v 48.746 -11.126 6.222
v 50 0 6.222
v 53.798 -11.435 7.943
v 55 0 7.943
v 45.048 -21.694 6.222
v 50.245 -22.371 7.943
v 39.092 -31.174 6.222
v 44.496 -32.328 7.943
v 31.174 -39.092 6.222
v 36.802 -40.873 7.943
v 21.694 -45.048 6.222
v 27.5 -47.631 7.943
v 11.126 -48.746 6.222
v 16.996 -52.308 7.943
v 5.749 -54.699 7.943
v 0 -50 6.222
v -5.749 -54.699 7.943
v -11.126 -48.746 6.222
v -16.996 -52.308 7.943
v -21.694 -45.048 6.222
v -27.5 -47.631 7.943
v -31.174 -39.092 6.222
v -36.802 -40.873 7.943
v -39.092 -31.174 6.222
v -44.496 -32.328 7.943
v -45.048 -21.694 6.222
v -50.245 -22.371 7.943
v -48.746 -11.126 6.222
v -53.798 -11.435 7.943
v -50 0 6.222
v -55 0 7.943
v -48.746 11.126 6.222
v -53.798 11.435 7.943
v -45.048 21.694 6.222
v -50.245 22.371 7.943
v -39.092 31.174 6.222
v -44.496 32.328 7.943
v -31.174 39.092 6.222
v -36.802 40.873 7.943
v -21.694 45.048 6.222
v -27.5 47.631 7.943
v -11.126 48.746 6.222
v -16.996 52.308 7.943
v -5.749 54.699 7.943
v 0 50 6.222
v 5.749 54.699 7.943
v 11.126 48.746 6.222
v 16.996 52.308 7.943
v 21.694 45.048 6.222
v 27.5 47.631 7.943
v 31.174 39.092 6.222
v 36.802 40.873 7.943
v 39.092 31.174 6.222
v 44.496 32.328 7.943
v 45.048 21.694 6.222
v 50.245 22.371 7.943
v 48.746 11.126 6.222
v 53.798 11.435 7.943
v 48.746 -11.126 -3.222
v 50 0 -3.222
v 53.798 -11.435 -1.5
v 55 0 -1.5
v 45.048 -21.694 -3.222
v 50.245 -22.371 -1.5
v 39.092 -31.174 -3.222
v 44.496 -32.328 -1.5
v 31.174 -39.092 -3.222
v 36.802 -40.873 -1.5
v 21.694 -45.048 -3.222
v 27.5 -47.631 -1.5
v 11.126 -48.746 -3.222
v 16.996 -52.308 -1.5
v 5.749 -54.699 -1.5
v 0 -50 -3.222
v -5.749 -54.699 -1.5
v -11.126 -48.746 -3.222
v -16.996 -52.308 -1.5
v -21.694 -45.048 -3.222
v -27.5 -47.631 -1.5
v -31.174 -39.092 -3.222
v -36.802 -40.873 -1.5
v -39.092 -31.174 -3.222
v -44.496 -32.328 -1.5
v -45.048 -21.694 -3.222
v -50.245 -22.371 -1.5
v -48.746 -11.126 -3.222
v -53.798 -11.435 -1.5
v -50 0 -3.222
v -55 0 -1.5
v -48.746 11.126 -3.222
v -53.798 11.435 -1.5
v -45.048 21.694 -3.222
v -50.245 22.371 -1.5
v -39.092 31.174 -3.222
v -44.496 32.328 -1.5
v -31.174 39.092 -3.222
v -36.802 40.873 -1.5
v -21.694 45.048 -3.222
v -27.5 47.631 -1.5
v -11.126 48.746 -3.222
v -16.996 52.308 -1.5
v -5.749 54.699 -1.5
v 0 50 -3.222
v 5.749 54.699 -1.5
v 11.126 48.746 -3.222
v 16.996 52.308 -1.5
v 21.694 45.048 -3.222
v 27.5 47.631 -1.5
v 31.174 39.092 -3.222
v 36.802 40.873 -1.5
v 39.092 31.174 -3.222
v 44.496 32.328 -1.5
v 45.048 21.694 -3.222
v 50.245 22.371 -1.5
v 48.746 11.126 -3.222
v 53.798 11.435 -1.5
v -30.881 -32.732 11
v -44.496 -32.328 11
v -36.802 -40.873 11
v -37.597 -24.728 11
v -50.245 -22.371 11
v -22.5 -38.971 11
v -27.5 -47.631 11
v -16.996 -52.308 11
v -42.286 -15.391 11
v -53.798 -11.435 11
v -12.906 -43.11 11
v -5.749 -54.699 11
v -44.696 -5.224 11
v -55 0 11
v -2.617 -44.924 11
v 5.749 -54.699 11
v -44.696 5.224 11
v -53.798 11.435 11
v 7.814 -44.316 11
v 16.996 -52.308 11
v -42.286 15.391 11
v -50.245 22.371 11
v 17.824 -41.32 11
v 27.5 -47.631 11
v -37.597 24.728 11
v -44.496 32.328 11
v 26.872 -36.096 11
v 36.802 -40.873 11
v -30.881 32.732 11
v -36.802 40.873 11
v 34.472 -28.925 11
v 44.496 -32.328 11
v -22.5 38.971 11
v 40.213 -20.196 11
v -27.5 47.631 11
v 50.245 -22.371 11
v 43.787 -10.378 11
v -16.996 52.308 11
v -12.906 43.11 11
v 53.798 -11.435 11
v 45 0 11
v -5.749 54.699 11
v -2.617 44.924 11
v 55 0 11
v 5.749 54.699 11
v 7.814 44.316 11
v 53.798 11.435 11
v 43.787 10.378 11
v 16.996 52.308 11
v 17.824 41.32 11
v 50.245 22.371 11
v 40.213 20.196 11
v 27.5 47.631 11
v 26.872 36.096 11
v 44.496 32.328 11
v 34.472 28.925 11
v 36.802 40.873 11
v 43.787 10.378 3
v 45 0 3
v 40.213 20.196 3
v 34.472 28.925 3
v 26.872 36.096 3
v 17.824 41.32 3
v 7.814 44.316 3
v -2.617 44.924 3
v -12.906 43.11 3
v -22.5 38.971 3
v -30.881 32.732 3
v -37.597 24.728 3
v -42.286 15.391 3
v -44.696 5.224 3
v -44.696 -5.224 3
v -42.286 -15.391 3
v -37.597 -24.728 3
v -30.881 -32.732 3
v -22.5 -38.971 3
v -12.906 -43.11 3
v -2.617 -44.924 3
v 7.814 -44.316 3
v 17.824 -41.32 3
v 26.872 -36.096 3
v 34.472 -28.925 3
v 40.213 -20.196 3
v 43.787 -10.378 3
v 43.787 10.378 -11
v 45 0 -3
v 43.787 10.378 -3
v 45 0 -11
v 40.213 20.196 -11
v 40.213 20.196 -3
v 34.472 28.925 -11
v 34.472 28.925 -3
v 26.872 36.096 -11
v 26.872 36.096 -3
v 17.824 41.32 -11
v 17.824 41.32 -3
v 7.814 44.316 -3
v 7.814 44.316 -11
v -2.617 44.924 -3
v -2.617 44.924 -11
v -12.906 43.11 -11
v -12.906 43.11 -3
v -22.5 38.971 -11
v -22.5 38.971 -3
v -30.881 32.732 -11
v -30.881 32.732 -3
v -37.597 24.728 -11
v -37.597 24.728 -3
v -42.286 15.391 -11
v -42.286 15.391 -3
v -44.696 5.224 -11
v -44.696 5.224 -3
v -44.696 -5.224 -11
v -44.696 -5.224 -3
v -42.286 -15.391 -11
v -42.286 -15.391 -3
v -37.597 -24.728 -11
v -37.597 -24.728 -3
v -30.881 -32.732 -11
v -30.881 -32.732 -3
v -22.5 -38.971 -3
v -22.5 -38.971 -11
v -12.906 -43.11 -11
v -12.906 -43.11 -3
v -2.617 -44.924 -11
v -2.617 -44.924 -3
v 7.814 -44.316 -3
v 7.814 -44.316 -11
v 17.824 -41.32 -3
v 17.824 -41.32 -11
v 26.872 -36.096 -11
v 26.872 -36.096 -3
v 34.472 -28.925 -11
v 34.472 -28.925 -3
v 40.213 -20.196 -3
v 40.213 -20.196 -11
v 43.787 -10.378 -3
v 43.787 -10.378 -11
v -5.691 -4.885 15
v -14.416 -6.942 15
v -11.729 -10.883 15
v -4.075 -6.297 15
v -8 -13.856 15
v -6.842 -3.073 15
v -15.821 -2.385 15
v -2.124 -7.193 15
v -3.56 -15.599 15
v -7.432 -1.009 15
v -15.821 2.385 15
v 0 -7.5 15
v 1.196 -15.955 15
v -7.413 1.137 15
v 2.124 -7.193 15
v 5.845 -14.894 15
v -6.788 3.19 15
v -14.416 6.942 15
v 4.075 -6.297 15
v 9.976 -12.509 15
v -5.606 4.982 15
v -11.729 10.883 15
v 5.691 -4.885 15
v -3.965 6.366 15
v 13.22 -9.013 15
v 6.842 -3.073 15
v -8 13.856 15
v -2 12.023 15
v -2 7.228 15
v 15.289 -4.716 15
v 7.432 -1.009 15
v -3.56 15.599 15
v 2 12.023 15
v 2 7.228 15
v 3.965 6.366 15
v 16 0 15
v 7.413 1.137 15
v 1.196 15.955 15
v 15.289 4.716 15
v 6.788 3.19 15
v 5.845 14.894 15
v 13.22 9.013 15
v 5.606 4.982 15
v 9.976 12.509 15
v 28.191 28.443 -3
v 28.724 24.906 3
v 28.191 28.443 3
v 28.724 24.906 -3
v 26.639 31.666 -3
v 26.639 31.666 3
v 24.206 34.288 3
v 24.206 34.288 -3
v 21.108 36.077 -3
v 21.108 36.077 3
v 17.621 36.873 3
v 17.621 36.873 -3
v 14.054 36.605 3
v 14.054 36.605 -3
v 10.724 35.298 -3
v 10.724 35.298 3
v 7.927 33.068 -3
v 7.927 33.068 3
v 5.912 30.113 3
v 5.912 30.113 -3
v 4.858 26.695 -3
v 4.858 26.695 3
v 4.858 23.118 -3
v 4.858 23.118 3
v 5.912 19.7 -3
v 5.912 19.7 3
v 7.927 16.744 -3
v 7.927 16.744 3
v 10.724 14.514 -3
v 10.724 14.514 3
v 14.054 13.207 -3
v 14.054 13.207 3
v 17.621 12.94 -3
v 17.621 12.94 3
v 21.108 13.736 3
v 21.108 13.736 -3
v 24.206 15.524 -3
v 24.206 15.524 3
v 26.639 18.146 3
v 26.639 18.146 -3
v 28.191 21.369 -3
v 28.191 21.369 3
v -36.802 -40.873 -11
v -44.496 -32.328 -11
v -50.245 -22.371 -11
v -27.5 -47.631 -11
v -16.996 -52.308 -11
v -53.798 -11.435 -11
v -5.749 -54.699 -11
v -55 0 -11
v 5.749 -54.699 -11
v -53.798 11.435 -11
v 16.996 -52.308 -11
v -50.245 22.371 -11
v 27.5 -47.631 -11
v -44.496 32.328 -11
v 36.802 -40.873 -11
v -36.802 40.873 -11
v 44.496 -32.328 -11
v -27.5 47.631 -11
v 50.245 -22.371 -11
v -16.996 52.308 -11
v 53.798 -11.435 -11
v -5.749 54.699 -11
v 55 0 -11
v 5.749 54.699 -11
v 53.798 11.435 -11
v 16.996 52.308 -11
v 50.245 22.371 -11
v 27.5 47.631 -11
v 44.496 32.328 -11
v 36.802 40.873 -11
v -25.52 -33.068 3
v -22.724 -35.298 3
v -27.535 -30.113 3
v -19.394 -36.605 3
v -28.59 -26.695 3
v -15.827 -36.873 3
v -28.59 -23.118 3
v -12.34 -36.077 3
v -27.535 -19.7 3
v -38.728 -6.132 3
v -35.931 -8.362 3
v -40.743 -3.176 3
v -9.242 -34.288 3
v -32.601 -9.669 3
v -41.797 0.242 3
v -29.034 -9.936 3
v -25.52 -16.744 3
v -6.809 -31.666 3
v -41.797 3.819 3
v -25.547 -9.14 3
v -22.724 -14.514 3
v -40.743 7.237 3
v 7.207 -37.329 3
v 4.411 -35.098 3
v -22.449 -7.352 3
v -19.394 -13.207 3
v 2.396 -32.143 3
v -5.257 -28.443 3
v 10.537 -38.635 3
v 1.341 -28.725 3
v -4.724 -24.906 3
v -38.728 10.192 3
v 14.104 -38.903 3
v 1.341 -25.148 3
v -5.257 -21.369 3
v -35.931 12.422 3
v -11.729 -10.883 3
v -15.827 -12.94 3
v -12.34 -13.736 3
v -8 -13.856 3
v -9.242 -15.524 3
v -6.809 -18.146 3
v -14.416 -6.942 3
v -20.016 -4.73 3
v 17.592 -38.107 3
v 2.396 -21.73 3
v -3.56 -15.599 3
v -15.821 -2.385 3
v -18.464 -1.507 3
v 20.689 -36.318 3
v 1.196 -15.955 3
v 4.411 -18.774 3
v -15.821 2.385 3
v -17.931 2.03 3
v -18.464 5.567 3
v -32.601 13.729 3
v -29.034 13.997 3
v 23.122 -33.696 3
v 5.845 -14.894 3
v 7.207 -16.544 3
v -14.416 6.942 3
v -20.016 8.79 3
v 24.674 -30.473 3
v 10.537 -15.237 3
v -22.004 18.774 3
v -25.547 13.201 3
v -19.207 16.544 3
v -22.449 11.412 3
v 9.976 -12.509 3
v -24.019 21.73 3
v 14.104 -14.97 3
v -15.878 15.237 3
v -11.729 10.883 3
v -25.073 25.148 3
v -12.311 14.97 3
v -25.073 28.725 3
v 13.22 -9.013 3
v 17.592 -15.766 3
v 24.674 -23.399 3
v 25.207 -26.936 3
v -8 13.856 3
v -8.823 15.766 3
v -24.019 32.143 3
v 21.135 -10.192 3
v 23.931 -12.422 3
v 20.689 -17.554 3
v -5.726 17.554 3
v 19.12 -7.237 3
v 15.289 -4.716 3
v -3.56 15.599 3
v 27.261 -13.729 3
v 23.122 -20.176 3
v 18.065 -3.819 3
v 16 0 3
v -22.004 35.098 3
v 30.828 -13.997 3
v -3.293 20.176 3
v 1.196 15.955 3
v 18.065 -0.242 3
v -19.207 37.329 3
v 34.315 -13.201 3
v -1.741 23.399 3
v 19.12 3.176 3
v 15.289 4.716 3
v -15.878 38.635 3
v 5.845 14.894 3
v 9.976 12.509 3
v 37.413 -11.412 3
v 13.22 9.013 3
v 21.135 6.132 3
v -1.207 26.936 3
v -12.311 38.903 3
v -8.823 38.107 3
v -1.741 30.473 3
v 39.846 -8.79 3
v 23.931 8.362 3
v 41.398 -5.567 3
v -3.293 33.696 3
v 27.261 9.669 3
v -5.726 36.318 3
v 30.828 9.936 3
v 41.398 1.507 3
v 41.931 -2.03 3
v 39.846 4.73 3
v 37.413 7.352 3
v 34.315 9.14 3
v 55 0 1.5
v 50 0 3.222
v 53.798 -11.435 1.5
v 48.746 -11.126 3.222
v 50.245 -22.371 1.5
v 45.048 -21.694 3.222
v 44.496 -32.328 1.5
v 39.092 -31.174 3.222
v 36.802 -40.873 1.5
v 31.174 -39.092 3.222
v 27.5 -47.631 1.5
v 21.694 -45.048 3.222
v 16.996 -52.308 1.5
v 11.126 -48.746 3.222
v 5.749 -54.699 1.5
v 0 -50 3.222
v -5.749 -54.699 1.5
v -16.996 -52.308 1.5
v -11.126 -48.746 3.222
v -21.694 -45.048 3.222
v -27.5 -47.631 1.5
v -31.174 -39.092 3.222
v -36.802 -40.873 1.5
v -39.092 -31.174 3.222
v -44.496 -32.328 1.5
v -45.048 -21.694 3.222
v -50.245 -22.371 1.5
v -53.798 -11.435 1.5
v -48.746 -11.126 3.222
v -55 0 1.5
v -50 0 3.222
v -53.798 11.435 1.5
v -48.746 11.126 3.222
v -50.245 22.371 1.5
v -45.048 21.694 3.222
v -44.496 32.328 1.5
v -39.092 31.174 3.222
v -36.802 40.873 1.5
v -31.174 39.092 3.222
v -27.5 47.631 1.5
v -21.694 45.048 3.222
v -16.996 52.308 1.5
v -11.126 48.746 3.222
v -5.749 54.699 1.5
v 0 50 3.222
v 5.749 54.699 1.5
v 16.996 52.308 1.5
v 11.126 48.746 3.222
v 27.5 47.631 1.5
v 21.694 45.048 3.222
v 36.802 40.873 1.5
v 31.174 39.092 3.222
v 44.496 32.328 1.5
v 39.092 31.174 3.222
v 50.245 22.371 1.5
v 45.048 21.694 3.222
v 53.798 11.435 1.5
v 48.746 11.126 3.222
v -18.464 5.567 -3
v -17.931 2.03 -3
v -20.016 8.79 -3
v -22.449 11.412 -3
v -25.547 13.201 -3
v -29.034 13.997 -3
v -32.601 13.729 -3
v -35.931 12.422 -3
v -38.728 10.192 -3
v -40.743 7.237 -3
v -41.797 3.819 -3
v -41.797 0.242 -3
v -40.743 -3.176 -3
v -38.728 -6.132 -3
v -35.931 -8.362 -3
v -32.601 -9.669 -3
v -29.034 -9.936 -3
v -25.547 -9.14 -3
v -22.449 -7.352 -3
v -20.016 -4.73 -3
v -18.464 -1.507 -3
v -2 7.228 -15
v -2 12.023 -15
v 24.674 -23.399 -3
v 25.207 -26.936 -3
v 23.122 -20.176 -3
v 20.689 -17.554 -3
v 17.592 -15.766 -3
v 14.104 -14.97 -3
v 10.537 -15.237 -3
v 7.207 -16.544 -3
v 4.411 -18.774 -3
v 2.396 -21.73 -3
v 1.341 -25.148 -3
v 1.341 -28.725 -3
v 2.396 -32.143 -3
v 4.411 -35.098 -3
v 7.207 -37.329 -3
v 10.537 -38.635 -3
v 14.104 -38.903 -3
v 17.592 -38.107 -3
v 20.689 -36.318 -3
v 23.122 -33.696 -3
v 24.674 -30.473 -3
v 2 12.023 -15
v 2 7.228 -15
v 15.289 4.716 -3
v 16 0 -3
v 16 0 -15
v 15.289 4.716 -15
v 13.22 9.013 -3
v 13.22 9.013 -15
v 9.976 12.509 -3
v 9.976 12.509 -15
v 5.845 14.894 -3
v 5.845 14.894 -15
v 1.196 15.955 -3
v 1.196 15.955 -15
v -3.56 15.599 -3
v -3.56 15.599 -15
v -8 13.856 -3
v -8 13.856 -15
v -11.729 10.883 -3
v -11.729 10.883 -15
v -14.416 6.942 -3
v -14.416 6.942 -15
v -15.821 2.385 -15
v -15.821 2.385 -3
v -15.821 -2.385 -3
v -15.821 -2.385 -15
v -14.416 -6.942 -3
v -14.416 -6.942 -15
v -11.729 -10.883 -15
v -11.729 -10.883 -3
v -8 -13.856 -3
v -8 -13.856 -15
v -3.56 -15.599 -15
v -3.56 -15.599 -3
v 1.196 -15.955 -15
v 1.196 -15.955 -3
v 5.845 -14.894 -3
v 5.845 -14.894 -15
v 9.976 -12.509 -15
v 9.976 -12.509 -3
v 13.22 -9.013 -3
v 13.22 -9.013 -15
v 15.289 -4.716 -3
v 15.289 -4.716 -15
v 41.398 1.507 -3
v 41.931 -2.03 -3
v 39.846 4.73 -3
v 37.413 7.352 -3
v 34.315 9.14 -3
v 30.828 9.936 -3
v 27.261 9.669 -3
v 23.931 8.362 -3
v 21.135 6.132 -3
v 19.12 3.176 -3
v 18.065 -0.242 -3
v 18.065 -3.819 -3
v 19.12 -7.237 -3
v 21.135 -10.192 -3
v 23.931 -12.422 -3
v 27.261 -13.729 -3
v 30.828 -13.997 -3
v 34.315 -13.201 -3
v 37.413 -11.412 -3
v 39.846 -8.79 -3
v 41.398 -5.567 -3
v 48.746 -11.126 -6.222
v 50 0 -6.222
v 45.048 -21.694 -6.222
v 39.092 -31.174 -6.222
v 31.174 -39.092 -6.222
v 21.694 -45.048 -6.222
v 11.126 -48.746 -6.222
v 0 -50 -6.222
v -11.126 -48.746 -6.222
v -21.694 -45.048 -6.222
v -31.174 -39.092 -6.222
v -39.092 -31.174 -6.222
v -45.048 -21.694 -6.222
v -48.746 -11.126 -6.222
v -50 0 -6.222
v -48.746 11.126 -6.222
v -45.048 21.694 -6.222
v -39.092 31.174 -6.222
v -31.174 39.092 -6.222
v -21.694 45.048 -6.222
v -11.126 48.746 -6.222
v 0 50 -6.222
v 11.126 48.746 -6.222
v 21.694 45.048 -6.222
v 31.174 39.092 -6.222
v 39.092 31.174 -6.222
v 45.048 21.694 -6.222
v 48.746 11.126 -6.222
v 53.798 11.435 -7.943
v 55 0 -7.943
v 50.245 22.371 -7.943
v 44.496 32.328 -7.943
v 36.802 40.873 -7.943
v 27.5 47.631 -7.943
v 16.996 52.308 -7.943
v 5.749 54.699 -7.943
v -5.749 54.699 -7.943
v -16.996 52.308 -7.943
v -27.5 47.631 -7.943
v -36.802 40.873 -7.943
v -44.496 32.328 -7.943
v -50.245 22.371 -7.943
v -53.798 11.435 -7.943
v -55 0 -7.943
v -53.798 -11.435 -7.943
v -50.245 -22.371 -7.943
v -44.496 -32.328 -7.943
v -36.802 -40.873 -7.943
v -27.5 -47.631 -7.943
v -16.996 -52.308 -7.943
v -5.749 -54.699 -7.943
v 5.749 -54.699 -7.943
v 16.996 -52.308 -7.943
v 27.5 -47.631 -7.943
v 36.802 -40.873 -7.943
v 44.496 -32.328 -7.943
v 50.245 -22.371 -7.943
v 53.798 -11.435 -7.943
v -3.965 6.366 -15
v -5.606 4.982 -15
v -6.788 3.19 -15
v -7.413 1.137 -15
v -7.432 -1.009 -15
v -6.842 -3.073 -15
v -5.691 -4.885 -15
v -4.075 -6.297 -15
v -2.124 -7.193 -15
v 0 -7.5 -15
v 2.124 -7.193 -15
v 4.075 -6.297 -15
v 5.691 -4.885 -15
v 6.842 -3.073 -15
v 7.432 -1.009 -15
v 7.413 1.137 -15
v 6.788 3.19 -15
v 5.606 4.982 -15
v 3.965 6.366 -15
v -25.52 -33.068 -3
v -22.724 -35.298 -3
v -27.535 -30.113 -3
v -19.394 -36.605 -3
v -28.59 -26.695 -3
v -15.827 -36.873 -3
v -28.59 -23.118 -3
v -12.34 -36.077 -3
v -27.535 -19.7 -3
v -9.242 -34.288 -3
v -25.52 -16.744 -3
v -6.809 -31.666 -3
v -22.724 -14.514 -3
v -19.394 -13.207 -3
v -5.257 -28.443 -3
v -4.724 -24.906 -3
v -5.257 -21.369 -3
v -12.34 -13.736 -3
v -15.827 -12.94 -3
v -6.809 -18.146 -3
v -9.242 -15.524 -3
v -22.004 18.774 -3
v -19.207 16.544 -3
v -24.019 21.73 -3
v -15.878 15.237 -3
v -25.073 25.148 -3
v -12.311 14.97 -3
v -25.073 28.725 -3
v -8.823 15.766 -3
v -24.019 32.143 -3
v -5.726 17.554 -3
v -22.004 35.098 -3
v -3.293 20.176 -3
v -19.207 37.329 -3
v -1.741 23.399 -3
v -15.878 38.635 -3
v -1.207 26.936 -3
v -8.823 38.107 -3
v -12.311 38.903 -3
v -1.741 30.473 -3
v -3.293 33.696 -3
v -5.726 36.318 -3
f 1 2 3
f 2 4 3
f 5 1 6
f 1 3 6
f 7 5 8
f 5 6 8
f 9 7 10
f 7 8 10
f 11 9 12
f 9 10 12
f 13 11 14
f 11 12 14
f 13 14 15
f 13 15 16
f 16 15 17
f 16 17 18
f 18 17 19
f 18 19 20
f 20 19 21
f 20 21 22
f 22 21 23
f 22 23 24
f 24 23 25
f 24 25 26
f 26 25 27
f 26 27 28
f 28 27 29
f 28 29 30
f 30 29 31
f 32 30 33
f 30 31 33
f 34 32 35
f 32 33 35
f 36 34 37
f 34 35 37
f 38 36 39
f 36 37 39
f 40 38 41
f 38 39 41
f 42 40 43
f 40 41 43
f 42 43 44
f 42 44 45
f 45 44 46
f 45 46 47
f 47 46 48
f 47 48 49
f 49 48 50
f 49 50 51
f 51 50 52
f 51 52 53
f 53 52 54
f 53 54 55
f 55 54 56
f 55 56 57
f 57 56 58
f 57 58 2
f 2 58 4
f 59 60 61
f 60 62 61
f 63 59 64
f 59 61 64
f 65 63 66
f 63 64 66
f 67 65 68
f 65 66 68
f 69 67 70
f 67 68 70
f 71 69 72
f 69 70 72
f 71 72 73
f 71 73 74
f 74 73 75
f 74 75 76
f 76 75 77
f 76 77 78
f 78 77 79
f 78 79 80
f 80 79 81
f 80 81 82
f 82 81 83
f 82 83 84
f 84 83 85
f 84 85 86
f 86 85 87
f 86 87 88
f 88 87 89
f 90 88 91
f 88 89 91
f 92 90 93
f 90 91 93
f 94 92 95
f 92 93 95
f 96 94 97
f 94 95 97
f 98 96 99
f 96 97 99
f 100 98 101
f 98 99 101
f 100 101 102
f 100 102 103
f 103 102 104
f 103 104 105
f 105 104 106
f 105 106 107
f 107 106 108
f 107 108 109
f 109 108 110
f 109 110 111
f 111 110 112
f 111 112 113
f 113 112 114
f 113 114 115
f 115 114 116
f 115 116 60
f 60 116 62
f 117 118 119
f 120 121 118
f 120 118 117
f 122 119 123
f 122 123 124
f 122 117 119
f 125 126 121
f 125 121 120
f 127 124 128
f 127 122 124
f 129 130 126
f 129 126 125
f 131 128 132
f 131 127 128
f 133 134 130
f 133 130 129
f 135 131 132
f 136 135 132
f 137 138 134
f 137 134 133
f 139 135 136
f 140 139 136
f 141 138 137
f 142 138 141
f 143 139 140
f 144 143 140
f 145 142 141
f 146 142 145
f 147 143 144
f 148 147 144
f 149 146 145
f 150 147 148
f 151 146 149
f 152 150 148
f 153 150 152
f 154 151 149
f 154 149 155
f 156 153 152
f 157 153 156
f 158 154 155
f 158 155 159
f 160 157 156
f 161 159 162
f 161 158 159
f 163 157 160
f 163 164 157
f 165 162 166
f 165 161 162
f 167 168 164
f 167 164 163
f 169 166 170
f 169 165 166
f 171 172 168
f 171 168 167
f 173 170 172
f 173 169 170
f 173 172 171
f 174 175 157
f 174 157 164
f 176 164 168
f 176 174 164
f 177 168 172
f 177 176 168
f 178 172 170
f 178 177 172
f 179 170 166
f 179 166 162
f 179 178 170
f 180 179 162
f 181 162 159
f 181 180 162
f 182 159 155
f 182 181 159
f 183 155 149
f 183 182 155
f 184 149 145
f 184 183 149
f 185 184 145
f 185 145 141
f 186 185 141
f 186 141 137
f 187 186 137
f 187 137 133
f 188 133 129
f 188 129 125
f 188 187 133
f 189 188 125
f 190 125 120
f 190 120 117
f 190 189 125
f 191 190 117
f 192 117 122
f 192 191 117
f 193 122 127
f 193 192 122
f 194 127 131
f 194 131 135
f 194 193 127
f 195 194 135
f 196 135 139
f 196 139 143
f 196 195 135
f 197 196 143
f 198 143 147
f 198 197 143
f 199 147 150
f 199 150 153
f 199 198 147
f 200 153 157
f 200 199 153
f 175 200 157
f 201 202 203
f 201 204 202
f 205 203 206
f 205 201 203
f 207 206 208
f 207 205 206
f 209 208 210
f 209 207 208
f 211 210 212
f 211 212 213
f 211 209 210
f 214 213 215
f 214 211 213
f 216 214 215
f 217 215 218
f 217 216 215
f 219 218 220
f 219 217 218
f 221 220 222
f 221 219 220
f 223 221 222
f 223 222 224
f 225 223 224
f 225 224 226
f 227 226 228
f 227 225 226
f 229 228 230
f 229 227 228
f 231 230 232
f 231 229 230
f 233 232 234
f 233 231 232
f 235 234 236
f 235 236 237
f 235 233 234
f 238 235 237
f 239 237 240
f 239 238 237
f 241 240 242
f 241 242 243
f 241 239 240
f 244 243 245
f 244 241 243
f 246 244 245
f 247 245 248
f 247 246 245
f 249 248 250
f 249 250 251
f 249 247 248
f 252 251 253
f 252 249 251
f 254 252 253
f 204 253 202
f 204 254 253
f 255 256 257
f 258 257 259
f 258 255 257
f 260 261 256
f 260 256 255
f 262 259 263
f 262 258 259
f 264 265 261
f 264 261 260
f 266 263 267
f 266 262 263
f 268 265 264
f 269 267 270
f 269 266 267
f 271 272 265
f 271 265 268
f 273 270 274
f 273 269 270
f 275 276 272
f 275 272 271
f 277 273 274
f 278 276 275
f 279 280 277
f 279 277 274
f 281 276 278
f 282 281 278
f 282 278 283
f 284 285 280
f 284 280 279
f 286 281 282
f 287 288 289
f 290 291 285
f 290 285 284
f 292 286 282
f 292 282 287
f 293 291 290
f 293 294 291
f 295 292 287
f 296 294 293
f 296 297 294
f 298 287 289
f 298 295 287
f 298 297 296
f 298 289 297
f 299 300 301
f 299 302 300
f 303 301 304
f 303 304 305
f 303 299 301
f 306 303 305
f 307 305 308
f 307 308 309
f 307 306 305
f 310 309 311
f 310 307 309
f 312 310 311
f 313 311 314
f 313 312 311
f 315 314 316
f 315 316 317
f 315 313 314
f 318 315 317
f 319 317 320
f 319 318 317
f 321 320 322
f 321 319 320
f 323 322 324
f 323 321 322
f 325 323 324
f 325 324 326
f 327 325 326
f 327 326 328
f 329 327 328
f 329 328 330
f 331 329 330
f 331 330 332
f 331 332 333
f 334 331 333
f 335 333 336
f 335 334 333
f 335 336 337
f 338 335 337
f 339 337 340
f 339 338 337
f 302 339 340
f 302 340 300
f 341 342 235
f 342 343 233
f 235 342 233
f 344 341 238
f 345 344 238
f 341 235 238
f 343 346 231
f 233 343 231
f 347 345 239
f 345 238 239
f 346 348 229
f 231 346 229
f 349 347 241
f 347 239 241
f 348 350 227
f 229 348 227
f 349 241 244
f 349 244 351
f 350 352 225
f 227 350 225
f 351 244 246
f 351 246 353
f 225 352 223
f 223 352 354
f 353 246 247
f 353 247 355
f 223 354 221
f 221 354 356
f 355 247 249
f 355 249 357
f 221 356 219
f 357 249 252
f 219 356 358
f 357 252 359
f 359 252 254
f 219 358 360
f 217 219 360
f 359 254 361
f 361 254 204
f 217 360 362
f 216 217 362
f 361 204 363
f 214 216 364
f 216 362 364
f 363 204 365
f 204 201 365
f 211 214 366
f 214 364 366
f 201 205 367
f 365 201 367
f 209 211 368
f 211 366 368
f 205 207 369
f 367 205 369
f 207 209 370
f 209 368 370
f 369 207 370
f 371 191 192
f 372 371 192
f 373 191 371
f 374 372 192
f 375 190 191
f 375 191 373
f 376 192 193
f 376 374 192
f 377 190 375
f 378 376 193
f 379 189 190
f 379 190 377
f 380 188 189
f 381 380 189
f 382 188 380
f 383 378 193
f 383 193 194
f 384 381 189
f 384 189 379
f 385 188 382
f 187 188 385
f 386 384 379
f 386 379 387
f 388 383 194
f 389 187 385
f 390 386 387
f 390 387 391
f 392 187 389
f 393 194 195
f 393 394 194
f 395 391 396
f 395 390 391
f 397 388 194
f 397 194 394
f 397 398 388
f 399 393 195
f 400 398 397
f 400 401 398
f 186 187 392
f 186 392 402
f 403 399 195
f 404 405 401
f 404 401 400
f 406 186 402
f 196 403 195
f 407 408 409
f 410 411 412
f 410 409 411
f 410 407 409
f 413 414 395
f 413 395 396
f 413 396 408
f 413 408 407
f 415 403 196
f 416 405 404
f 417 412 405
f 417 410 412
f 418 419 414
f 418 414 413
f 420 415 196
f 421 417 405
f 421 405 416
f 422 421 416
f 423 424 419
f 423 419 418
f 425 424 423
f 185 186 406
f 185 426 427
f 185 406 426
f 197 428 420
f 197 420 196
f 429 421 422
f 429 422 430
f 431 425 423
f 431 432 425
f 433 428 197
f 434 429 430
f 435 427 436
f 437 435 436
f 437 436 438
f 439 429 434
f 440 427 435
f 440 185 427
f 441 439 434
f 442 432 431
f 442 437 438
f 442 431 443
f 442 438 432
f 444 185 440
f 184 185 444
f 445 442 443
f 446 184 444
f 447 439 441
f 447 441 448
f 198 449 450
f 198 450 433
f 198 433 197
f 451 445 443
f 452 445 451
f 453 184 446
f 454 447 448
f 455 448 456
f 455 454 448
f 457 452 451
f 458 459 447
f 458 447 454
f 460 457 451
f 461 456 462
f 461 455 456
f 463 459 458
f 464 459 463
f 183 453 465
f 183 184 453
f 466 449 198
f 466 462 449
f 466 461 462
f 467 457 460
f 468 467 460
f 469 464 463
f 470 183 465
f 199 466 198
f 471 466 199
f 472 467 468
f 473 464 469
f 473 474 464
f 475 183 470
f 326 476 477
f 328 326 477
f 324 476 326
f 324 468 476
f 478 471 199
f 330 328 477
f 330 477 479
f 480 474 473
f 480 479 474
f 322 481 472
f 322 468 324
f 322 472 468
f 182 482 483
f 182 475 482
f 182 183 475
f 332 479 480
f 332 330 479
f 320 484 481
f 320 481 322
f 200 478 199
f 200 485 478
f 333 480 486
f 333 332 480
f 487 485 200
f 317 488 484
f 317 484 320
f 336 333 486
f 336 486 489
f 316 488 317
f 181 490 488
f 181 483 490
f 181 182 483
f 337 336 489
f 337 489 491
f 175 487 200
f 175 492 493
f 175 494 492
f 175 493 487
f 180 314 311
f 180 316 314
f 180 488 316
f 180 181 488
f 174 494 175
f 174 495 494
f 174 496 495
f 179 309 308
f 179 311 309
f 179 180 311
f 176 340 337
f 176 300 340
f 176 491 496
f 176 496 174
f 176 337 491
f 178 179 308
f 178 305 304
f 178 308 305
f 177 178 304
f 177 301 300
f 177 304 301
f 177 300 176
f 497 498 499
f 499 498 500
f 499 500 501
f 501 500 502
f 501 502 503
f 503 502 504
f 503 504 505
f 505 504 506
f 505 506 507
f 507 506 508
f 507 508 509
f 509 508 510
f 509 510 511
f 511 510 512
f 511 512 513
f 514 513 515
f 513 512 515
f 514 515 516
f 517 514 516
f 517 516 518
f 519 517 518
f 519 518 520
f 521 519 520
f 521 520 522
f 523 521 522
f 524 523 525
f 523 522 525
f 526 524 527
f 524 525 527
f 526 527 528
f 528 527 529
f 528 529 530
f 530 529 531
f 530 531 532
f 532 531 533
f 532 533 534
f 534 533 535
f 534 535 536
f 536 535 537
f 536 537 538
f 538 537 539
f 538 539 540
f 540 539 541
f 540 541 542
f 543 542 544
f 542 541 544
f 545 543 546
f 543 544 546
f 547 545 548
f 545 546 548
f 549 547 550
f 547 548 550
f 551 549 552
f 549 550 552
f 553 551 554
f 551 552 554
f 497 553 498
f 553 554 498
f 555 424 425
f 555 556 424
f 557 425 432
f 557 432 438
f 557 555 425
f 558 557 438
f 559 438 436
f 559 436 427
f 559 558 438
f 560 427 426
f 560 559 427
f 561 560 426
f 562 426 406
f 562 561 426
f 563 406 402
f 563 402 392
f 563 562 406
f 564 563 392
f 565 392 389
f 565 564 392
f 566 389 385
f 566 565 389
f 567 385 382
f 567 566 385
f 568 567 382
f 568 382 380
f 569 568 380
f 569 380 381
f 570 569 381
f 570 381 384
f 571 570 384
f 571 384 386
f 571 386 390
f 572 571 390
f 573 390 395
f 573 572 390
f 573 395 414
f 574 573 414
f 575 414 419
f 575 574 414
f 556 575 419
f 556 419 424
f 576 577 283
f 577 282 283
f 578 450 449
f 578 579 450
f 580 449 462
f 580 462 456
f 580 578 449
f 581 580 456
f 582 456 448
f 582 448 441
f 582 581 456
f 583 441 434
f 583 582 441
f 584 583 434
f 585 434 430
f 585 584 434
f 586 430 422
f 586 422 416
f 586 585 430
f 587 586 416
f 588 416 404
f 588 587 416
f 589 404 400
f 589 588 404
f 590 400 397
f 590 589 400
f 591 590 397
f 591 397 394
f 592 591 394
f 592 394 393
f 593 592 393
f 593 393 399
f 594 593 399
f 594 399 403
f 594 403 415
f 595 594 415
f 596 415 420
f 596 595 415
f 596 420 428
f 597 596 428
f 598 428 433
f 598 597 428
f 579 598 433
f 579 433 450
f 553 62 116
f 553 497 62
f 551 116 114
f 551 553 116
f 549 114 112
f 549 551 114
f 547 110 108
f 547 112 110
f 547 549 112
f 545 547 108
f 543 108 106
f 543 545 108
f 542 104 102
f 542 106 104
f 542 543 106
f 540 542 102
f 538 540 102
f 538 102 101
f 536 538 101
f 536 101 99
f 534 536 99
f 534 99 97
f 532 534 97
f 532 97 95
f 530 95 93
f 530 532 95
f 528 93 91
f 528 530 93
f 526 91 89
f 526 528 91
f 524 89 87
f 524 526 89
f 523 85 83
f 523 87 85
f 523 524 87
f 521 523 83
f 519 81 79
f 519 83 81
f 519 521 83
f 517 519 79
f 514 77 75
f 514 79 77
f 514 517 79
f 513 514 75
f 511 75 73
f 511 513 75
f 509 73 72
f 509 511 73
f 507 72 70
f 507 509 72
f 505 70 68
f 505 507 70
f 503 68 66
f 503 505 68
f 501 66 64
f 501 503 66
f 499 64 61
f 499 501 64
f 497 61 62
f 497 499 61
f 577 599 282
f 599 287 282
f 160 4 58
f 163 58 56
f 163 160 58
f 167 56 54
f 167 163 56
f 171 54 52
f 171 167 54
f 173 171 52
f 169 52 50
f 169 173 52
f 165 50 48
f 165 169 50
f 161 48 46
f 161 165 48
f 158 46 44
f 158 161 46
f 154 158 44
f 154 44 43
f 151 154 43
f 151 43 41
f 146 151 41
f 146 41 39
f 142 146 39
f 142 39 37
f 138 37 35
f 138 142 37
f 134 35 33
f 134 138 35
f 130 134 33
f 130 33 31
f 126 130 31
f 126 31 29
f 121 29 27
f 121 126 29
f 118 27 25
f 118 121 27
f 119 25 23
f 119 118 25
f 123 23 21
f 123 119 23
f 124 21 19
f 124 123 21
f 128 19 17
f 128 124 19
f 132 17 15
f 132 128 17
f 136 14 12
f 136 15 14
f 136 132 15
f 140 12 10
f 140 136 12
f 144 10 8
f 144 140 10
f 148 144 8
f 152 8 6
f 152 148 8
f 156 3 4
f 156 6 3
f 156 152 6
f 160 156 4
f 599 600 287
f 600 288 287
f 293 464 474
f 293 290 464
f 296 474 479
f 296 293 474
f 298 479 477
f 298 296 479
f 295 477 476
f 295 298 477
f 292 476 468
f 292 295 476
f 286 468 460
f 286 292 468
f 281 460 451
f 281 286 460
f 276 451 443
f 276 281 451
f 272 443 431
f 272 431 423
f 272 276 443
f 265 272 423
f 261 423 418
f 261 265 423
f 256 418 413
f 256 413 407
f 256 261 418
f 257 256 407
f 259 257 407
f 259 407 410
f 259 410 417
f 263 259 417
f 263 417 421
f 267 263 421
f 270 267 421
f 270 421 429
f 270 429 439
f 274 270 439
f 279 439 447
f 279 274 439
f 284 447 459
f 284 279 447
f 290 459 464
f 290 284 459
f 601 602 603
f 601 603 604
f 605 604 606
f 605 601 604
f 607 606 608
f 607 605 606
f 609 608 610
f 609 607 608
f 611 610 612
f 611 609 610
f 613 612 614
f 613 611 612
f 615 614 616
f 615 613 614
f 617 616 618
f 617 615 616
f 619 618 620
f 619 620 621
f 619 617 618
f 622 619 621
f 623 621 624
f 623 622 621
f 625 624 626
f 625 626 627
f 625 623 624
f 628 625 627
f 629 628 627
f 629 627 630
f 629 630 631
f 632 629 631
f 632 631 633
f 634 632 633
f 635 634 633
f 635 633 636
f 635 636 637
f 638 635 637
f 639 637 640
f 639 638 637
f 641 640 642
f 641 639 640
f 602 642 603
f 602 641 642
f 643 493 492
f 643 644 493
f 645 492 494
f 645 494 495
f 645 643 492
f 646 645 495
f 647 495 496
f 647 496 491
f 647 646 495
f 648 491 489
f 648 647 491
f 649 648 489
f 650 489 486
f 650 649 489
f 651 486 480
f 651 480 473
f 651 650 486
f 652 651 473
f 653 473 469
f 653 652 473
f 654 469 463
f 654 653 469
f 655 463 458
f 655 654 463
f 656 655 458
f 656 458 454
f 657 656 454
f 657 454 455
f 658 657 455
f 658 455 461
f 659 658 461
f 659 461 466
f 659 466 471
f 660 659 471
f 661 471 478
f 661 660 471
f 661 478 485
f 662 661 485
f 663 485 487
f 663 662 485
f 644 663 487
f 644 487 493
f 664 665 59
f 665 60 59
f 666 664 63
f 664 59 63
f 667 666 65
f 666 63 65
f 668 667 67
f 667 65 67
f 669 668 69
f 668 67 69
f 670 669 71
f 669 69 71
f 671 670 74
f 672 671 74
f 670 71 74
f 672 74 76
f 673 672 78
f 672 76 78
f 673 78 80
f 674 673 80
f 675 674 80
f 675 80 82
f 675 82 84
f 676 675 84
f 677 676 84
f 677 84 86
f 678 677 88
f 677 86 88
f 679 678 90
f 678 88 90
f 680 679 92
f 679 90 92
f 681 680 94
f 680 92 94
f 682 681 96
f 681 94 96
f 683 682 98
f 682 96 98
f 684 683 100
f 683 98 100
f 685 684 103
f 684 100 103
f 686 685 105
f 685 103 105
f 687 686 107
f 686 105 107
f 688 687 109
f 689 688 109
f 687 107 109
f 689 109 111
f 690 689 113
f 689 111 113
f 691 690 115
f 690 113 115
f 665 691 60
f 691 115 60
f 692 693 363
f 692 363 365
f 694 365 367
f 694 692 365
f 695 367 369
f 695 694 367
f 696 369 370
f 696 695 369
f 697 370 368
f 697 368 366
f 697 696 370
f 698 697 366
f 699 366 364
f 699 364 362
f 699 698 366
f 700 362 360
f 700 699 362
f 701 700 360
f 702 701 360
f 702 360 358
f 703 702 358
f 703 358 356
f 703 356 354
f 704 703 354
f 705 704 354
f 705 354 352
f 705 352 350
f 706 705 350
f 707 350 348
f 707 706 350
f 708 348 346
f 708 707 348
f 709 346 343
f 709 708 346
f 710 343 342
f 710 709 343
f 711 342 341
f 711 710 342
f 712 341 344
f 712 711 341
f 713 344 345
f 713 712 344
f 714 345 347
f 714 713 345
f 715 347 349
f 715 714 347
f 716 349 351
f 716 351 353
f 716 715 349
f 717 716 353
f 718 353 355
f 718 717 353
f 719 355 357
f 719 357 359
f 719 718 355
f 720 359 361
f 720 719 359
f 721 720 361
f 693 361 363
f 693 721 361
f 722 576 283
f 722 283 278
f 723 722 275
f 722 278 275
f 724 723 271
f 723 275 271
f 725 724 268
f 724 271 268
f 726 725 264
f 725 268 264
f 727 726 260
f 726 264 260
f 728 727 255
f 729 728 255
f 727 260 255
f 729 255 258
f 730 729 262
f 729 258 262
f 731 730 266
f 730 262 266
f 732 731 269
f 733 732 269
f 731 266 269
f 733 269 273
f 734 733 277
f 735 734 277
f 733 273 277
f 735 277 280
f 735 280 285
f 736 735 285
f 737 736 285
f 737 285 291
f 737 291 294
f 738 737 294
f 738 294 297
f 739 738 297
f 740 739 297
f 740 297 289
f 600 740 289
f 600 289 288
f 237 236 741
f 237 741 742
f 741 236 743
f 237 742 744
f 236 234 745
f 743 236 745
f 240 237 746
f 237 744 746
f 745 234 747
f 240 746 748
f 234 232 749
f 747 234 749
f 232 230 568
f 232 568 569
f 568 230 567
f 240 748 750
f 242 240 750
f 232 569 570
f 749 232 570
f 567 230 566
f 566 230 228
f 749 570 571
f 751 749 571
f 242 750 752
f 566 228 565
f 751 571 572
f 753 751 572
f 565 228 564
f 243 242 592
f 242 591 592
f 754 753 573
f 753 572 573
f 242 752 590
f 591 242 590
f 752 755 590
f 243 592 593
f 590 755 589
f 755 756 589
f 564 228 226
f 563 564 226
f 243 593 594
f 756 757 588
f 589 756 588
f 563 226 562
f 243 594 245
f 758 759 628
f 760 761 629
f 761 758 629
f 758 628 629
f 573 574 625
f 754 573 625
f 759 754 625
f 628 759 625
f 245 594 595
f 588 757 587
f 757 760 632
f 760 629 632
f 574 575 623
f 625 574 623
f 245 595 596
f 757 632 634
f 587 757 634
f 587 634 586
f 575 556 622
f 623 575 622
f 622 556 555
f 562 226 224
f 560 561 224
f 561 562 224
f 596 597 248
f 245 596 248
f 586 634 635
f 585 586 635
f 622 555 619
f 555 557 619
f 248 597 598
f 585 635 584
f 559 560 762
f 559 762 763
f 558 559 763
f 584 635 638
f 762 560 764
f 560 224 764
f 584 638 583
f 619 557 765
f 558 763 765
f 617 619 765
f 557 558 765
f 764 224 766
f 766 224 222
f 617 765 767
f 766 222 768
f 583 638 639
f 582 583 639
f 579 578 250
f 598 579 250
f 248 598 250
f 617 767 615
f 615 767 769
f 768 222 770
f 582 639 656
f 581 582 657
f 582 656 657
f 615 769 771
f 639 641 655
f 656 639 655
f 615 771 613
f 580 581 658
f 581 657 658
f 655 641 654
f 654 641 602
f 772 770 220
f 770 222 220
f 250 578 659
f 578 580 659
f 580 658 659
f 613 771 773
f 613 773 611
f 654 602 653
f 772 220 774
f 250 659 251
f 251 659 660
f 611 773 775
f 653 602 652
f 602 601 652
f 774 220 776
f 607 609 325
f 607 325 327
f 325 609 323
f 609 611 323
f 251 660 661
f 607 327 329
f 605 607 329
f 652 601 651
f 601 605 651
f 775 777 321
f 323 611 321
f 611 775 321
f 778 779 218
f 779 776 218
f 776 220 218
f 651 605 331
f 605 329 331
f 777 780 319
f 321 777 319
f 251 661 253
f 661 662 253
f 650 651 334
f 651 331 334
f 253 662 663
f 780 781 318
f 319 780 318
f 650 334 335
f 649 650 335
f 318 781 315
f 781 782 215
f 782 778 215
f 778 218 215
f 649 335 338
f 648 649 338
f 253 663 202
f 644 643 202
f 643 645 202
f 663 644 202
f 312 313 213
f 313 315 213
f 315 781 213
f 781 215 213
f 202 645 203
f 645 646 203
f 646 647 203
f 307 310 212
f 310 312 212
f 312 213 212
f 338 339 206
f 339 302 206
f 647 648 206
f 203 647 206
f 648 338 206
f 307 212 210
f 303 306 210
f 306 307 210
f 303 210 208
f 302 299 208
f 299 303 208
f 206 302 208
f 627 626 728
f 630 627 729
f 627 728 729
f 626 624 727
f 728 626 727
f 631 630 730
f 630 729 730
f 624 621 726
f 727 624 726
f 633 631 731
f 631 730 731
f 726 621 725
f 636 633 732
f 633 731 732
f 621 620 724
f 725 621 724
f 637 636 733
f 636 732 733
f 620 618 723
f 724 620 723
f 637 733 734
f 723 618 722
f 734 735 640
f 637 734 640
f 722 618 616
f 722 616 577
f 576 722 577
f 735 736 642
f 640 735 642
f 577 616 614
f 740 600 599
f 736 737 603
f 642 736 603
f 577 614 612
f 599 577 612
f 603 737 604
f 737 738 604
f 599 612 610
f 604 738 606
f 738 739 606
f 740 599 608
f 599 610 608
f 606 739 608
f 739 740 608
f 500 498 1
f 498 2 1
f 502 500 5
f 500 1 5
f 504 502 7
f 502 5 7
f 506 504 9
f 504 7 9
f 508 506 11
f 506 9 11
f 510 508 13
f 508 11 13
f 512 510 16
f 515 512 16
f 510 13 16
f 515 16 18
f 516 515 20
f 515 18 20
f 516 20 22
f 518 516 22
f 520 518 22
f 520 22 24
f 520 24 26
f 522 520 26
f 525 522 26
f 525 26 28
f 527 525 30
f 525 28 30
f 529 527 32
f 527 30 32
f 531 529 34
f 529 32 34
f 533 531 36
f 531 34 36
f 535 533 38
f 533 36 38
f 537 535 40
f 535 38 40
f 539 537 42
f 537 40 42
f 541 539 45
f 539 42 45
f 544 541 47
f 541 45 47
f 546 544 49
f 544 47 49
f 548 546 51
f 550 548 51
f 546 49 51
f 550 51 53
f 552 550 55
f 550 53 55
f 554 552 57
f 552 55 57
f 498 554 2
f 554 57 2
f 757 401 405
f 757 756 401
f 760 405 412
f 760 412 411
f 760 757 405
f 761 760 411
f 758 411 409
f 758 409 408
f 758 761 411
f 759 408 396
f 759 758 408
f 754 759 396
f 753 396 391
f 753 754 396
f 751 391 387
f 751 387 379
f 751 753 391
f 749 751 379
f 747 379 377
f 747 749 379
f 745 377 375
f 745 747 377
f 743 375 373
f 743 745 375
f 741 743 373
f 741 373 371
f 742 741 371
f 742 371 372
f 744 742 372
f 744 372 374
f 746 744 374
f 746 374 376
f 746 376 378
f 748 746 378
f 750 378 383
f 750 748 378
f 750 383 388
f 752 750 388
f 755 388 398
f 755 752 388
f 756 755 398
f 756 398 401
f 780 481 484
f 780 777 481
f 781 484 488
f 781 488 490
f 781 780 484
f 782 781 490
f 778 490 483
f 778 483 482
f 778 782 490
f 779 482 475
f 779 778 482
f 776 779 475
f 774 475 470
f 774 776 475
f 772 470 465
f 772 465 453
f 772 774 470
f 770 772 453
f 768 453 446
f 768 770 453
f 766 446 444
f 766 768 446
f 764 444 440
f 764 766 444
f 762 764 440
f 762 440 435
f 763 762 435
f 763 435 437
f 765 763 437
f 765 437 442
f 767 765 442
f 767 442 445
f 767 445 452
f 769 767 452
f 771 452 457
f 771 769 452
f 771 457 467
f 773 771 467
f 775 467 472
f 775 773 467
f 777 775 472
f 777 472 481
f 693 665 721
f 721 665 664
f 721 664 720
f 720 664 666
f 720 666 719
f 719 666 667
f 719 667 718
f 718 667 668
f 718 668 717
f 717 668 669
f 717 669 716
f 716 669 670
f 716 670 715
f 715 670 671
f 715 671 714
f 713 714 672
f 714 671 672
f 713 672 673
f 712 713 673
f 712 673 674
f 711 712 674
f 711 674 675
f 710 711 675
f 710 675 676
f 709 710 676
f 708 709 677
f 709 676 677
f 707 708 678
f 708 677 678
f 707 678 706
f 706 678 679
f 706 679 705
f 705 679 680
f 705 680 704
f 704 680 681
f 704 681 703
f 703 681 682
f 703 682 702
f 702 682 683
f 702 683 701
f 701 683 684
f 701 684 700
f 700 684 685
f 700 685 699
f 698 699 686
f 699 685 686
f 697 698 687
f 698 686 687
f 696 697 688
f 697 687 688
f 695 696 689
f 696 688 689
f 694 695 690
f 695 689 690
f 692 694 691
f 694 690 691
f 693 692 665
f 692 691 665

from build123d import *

# Parameters (mm, degrees)
SKETCH_1_R      = 16
EXTRUDE_1_DEPTH = 15
SKETCH_1_3_R    = 45
SKETCH_1_3_R_2  = 12
SKETCH_1_3_R_3  = 16
EXTRUDE_2_DEPTH = 3
SKETCH_1_4_R    = 55
SKETCH_1_4_R_2  = 45
EXTRUDE_3_DEPTH = 11


with BuildPart() as part:
    # 草图1 → 凸台-拉伸1 (new, symmetric)
    with BuildSketch(Plane.XY):
        Circle(SKETCH_1_R)
        with BuildLine():
            Line((-2, 12.022916711), (0, 12.022916711))
            Line((0, 12.022916711), (2, 12.022916711))
            Line((2, 12.022916711), (2, 7.228416147))
            ThreePointArc((2, 7.228416147), (0, -7.5), (-2, 7.228416147))
            Line((-2, 7.228416147), (-2, 12.022916711))
        make_face(mode=Mode.SUBTRACT)
    extrude(amount=EXTRUDE_1_DEPTH, both=True)

    # 草图1<3> → 凸台-拉伸2 (add, symmetric)
    with BuildSketch(Plane.XY):
        Circle(SKETCH_1_3_R)
        with Locations((-16.723776012, -24.906130087)):
            Circle(SKETCH_1_3_R_2, mode=Mode.SUBTRACT)
        with Locations((13.207453359, -26.936279917)):
            Circle(SKETCH_1_3_R_2, mode=Mode.SUBTRACT)
        with Locations((29.931229371, -2.03014983)):
            Circle(SKETCH_1_3_R_2, mode=Mode.SUBTRACT)
        with Locations((-29.931229371, 2.03014983)):
            Circle(SKETCH_1_3_R_2, mode=Mode.SUBTRACT)
        with Locations((-13.207453359, 26.936279917)):
            Circle(SKETCH_1_3_R_2, mode=Mode.SUBTRACT)
        Circle(SKETCH_1_3_R_3, mode=Mode.SUBTRACT)
        with Locations((16.723776012, 24.906130087)):
            Circle(SKETCH_1_3_R_2, mode=Mode.SUBTRACT)
    extrude(amount=EXTRUDE_2_DEPTH, both=True)

    # 草图1<4> → 凸台-拉伸3 (add, symmetric)
    with BuildSketch(Plane.XY):
        Circle(SKETCH_1_4_R)
        Circle(SKETCH_1_4_R_2, mode=Mode.SUBTRACT)
    extrude(amount=EXTRUDE_3_DEPTH, both=True)

    # 草图2 → 切除-旋转2 (revolve, cut)
    with BuildSketch(Plane(origin=(0, 0, 0), x_dir=(0, 0, -1), z_dir=(1, 0, 0))):
        Polygon((-1.5, 55), (-7.943276133, 55), (-6.221638066, 50), (-3.221638066, 50), align=None)
        Polygon((7.943276133, 55), (1.5, 55), (3.221638066, 50), (6.221638066, 50), align=None)
    revolve(axis=Axis((0, 0, 17.503748609), (0, 0, -1)), mode=Mode.SUBTRACT)


solid = part.part
